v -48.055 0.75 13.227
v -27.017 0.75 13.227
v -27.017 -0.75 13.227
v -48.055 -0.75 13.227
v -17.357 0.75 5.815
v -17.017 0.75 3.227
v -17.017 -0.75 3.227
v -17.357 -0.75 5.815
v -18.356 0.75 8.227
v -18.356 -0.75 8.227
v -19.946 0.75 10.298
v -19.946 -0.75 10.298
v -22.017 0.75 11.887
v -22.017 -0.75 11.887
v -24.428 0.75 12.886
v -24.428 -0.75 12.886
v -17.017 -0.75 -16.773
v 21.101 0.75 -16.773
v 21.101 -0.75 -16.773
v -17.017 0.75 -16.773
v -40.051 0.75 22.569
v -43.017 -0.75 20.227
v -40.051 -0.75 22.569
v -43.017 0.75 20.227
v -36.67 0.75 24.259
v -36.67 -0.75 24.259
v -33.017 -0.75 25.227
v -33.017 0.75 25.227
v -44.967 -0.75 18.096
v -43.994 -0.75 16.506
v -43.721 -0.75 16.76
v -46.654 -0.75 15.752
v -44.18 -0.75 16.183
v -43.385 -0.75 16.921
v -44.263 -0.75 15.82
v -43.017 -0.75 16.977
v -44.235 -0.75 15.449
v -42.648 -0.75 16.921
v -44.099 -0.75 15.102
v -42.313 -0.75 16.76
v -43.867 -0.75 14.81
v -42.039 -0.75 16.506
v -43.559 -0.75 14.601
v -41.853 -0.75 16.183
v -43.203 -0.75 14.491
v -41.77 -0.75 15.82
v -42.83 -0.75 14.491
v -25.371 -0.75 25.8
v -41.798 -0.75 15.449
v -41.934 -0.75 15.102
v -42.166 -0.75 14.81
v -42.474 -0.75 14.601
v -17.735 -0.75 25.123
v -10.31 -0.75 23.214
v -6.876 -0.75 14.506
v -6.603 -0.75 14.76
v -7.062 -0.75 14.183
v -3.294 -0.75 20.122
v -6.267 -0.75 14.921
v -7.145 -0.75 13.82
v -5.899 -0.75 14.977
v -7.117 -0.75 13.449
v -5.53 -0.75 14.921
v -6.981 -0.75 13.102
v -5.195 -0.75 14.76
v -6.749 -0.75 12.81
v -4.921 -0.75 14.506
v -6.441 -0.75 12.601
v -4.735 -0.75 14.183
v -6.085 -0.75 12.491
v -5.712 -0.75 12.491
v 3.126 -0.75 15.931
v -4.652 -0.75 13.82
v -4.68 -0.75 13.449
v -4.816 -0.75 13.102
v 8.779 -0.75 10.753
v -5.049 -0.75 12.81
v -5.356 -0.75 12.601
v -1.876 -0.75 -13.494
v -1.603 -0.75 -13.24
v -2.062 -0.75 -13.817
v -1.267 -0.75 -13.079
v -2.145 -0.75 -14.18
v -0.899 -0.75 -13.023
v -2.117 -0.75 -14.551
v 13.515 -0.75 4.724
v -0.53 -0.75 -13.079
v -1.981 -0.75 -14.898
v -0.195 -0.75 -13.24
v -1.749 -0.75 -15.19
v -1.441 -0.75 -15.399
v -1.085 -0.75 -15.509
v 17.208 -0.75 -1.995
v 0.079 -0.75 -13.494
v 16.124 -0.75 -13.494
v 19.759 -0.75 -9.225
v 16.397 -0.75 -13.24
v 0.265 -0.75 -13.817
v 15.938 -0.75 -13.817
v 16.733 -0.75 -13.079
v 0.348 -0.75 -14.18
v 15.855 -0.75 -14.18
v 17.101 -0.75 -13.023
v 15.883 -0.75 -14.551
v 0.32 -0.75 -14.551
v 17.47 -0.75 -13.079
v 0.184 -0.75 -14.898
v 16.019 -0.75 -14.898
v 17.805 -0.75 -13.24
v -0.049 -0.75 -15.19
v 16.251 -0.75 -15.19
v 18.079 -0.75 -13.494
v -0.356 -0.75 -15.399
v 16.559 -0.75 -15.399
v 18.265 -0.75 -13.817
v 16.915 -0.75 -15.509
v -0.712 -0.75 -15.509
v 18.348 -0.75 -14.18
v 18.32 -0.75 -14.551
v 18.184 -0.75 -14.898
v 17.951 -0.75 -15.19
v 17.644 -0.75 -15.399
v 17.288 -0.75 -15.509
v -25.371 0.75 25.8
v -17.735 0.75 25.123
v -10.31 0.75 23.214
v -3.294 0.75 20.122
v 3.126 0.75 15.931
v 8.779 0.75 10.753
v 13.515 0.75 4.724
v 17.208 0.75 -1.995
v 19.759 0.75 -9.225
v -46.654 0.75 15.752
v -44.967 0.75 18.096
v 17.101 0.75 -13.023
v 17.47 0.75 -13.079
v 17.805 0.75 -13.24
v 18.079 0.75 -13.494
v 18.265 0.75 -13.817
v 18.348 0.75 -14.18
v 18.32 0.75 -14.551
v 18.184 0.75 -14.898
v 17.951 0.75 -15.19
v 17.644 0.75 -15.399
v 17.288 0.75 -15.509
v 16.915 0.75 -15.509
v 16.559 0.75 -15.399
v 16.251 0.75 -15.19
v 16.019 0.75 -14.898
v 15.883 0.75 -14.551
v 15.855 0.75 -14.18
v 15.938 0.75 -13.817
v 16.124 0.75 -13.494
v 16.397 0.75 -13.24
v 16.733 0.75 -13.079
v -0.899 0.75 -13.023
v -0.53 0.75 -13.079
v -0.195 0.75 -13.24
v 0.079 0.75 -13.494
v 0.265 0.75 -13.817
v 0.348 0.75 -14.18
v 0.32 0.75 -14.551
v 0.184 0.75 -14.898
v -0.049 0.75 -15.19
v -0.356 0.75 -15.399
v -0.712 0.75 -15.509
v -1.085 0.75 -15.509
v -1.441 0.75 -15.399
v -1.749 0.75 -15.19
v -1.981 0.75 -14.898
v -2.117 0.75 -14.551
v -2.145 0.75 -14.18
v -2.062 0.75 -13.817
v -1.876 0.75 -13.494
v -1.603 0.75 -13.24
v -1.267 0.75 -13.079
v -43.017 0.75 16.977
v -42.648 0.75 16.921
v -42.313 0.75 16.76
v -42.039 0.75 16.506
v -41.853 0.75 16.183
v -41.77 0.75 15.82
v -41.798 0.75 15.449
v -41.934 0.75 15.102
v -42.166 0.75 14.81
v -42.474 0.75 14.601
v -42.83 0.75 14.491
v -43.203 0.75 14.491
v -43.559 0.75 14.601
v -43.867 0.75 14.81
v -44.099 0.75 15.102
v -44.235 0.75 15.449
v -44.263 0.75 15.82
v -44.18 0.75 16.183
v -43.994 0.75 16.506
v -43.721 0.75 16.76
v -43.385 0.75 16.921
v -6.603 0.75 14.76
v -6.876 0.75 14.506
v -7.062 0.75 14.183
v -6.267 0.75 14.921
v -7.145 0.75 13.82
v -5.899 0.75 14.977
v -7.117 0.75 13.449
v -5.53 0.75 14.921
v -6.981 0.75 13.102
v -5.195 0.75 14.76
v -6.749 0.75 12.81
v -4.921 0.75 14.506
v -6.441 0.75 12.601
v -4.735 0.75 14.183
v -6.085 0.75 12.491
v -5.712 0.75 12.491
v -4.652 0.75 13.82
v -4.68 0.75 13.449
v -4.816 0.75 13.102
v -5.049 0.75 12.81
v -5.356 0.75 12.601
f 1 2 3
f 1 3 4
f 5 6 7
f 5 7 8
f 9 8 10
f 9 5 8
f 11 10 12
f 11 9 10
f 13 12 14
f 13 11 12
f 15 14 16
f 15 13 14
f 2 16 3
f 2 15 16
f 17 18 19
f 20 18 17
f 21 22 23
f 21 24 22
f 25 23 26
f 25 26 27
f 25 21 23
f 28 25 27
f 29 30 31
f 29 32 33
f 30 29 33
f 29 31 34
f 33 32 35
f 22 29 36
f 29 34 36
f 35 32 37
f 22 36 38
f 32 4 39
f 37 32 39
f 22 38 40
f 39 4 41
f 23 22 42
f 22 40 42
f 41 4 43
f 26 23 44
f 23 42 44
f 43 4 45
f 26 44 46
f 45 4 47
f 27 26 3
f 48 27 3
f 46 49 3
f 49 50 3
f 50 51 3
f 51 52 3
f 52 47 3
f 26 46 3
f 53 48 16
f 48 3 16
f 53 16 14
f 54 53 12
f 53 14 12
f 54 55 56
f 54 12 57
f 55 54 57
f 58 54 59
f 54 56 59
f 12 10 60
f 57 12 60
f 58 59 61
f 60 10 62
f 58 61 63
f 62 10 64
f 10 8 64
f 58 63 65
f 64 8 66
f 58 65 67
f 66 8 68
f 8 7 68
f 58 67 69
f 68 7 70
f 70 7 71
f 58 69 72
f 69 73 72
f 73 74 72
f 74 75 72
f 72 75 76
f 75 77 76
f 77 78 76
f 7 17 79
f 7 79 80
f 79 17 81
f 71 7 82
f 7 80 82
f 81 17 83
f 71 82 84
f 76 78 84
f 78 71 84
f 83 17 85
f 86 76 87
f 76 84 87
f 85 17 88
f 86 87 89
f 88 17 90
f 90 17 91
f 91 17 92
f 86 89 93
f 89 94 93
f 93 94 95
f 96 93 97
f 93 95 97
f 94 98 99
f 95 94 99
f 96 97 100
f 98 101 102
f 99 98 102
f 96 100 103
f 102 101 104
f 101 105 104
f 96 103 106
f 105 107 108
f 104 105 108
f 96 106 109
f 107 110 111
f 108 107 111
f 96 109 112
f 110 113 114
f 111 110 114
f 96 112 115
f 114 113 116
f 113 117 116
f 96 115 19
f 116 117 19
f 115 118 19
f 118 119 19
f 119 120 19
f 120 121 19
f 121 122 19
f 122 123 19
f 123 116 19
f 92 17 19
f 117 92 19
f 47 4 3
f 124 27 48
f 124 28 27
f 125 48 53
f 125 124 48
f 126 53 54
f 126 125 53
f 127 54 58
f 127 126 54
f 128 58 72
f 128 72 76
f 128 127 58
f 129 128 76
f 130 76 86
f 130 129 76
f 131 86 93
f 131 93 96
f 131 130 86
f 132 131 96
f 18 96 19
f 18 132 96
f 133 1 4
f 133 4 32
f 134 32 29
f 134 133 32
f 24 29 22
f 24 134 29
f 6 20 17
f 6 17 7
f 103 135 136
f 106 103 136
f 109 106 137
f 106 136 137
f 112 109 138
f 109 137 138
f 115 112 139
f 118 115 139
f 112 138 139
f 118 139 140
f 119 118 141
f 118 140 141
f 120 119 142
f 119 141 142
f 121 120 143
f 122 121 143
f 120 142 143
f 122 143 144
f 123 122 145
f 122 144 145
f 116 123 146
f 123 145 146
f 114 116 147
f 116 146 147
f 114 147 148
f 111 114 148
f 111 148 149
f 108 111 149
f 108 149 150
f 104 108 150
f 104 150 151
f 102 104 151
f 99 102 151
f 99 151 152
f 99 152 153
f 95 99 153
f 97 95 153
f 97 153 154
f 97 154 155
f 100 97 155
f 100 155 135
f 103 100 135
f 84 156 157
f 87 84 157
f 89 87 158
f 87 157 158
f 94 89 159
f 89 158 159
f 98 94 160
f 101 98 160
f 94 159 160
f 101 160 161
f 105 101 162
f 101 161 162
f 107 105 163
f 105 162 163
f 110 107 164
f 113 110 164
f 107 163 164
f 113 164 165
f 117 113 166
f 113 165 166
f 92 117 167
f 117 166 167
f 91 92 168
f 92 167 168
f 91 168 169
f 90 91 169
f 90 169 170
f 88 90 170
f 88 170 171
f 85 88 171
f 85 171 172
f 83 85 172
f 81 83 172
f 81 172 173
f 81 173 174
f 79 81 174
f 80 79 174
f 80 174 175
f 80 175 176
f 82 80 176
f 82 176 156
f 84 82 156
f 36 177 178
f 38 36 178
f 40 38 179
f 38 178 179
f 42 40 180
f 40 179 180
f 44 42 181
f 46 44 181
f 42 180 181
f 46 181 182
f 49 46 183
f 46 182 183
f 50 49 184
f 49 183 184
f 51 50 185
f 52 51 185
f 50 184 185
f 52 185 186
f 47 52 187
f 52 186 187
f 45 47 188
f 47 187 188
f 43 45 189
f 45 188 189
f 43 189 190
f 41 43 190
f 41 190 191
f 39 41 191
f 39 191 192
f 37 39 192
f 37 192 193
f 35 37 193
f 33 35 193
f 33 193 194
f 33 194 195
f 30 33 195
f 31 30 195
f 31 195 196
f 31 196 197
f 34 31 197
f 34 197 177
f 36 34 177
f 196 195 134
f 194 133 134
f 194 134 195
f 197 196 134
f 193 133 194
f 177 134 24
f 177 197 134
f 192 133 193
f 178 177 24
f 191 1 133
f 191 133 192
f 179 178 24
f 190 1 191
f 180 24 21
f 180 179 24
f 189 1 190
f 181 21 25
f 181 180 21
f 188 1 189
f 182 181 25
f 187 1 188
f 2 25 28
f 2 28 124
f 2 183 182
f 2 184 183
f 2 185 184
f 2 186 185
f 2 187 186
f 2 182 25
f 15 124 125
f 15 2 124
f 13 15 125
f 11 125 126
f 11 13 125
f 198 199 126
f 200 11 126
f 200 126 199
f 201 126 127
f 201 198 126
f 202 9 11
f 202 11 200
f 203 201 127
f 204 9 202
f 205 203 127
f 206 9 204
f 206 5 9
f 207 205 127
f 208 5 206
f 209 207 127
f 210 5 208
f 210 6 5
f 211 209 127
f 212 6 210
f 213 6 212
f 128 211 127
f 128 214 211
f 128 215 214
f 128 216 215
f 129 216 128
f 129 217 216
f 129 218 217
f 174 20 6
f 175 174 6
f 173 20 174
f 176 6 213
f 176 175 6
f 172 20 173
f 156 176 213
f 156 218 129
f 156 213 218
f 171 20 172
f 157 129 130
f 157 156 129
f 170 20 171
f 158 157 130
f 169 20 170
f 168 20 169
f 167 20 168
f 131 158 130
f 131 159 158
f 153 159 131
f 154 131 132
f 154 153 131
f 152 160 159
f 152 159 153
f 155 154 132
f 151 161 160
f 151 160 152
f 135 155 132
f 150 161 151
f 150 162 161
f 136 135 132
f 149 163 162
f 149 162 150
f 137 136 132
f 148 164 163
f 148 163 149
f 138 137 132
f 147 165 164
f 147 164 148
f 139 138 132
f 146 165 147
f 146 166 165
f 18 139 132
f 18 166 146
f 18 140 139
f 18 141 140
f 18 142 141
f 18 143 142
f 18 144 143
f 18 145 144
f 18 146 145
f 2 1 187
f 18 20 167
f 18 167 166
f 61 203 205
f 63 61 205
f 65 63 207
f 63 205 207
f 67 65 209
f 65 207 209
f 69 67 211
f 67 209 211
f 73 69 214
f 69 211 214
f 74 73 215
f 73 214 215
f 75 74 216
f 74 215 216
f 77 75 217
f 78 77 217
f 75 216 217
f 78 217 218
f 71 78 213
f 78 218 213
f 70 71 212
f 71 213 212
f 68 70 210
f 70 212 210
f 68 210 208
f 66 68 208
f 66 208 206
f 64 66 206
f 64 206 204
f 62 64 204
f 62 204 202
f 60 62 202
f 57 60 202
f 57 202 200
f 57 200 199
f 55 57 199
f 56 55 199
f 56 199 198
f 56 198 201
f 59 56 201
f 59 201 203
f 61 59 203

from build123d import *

# Parameters (mm, degrees)
PCB_BOARD_DEPTH     = 0.75
BOSS_EXTRUDE1_DEPTH = 1.5
SKETCH5_R           = 1.25
MOUTING_HOLES_DEPTH = 10


with BuildPart() as part:
    # Sketch1 → Pcb Board (new, symmetric)
    with BuildSketch(Plane(origin=(0, 0, 0), x_dir=(1, 0, 0), z_dir=(0, 1, 0))):
        with BuildLine():
            ThreePointArc((-33.016678433, -25.226747869), (3.126055598, -15.93137563), (21.101274409, 16.773252131))
            Line((21.101274409, 16.773252131), (-17.016678433, 16.773252131))
            Line((-17.016678433, 16.773252131), (-17.016678433, -3.226747869))
            ThreePointArc((-17.016678433, -3.226747869), (-19.945610621, -10.297815681), (-27.016678433, -13.226747869))
            Line((-27.016678433, -13.226747869), (-43.016678433, -13.226747869))
            Line((-43.016678433, -13.226747869), (-43.016678432, -20.226747869))
            ThreePointArc((-43.016678433, -20.226747869), (-38.403625629, -23.500642262), (-33.016678433, -25.226747869))
        make_face()
    extrude(amount=PCB_BOARD_DEPTH, both=True)

    # Sketch6 → Boss-Extrude1 (add)
    with BuildSketch(Plane(origin=(0, 0.75, 0), x_dir=(1, 0, 0), z_dir=(0, 1, 0))):
        with BuildLine():
            Line((-43.016678433, -13.226747869), (-48.055127106, -13.226747869))
            ThreePointArc((-48.055127106, -13.226747869), (-45.844966452, -16.949205227), (-43.016678433, -20.226747869))
            Line((-43.016678433, -20.226747869), (-43.016678433, -13.226747869))
        make_face()
    extrude(amount=-BOSS_EXTRUDE1_DEPTH)

    # Sketch5 → Mouting Holes (cut)
    with BuildSketch(Plane(origin=(0, 0.75, 0), x_dir=(1, 0, 0), z_dir=(0, 1, 0))):
        with Locations(Location((-43.016678433, -15.726747869, 0), (0, 0, 270))):
            Circle(SKETCH5_R)
        with Locations(Location((17.101274409, 14.273252131, 0), (0, 0, 270))):
            Circle(SKETCH5_R)
        with Locations(Location((-5.898725591, -13.726747869, 0), (0, 0, 270))):
            Circle(SKETCH5_R)
        with Locations(Location((-0.898725591, 14.273252131, 0), (0, 0, 270))):
            Circle(SKETCH5_R)
    extrude(amount=-MOUTING_HOLES_DEPTH, mode=Mode.SUBTRACT)


solid = part.part
